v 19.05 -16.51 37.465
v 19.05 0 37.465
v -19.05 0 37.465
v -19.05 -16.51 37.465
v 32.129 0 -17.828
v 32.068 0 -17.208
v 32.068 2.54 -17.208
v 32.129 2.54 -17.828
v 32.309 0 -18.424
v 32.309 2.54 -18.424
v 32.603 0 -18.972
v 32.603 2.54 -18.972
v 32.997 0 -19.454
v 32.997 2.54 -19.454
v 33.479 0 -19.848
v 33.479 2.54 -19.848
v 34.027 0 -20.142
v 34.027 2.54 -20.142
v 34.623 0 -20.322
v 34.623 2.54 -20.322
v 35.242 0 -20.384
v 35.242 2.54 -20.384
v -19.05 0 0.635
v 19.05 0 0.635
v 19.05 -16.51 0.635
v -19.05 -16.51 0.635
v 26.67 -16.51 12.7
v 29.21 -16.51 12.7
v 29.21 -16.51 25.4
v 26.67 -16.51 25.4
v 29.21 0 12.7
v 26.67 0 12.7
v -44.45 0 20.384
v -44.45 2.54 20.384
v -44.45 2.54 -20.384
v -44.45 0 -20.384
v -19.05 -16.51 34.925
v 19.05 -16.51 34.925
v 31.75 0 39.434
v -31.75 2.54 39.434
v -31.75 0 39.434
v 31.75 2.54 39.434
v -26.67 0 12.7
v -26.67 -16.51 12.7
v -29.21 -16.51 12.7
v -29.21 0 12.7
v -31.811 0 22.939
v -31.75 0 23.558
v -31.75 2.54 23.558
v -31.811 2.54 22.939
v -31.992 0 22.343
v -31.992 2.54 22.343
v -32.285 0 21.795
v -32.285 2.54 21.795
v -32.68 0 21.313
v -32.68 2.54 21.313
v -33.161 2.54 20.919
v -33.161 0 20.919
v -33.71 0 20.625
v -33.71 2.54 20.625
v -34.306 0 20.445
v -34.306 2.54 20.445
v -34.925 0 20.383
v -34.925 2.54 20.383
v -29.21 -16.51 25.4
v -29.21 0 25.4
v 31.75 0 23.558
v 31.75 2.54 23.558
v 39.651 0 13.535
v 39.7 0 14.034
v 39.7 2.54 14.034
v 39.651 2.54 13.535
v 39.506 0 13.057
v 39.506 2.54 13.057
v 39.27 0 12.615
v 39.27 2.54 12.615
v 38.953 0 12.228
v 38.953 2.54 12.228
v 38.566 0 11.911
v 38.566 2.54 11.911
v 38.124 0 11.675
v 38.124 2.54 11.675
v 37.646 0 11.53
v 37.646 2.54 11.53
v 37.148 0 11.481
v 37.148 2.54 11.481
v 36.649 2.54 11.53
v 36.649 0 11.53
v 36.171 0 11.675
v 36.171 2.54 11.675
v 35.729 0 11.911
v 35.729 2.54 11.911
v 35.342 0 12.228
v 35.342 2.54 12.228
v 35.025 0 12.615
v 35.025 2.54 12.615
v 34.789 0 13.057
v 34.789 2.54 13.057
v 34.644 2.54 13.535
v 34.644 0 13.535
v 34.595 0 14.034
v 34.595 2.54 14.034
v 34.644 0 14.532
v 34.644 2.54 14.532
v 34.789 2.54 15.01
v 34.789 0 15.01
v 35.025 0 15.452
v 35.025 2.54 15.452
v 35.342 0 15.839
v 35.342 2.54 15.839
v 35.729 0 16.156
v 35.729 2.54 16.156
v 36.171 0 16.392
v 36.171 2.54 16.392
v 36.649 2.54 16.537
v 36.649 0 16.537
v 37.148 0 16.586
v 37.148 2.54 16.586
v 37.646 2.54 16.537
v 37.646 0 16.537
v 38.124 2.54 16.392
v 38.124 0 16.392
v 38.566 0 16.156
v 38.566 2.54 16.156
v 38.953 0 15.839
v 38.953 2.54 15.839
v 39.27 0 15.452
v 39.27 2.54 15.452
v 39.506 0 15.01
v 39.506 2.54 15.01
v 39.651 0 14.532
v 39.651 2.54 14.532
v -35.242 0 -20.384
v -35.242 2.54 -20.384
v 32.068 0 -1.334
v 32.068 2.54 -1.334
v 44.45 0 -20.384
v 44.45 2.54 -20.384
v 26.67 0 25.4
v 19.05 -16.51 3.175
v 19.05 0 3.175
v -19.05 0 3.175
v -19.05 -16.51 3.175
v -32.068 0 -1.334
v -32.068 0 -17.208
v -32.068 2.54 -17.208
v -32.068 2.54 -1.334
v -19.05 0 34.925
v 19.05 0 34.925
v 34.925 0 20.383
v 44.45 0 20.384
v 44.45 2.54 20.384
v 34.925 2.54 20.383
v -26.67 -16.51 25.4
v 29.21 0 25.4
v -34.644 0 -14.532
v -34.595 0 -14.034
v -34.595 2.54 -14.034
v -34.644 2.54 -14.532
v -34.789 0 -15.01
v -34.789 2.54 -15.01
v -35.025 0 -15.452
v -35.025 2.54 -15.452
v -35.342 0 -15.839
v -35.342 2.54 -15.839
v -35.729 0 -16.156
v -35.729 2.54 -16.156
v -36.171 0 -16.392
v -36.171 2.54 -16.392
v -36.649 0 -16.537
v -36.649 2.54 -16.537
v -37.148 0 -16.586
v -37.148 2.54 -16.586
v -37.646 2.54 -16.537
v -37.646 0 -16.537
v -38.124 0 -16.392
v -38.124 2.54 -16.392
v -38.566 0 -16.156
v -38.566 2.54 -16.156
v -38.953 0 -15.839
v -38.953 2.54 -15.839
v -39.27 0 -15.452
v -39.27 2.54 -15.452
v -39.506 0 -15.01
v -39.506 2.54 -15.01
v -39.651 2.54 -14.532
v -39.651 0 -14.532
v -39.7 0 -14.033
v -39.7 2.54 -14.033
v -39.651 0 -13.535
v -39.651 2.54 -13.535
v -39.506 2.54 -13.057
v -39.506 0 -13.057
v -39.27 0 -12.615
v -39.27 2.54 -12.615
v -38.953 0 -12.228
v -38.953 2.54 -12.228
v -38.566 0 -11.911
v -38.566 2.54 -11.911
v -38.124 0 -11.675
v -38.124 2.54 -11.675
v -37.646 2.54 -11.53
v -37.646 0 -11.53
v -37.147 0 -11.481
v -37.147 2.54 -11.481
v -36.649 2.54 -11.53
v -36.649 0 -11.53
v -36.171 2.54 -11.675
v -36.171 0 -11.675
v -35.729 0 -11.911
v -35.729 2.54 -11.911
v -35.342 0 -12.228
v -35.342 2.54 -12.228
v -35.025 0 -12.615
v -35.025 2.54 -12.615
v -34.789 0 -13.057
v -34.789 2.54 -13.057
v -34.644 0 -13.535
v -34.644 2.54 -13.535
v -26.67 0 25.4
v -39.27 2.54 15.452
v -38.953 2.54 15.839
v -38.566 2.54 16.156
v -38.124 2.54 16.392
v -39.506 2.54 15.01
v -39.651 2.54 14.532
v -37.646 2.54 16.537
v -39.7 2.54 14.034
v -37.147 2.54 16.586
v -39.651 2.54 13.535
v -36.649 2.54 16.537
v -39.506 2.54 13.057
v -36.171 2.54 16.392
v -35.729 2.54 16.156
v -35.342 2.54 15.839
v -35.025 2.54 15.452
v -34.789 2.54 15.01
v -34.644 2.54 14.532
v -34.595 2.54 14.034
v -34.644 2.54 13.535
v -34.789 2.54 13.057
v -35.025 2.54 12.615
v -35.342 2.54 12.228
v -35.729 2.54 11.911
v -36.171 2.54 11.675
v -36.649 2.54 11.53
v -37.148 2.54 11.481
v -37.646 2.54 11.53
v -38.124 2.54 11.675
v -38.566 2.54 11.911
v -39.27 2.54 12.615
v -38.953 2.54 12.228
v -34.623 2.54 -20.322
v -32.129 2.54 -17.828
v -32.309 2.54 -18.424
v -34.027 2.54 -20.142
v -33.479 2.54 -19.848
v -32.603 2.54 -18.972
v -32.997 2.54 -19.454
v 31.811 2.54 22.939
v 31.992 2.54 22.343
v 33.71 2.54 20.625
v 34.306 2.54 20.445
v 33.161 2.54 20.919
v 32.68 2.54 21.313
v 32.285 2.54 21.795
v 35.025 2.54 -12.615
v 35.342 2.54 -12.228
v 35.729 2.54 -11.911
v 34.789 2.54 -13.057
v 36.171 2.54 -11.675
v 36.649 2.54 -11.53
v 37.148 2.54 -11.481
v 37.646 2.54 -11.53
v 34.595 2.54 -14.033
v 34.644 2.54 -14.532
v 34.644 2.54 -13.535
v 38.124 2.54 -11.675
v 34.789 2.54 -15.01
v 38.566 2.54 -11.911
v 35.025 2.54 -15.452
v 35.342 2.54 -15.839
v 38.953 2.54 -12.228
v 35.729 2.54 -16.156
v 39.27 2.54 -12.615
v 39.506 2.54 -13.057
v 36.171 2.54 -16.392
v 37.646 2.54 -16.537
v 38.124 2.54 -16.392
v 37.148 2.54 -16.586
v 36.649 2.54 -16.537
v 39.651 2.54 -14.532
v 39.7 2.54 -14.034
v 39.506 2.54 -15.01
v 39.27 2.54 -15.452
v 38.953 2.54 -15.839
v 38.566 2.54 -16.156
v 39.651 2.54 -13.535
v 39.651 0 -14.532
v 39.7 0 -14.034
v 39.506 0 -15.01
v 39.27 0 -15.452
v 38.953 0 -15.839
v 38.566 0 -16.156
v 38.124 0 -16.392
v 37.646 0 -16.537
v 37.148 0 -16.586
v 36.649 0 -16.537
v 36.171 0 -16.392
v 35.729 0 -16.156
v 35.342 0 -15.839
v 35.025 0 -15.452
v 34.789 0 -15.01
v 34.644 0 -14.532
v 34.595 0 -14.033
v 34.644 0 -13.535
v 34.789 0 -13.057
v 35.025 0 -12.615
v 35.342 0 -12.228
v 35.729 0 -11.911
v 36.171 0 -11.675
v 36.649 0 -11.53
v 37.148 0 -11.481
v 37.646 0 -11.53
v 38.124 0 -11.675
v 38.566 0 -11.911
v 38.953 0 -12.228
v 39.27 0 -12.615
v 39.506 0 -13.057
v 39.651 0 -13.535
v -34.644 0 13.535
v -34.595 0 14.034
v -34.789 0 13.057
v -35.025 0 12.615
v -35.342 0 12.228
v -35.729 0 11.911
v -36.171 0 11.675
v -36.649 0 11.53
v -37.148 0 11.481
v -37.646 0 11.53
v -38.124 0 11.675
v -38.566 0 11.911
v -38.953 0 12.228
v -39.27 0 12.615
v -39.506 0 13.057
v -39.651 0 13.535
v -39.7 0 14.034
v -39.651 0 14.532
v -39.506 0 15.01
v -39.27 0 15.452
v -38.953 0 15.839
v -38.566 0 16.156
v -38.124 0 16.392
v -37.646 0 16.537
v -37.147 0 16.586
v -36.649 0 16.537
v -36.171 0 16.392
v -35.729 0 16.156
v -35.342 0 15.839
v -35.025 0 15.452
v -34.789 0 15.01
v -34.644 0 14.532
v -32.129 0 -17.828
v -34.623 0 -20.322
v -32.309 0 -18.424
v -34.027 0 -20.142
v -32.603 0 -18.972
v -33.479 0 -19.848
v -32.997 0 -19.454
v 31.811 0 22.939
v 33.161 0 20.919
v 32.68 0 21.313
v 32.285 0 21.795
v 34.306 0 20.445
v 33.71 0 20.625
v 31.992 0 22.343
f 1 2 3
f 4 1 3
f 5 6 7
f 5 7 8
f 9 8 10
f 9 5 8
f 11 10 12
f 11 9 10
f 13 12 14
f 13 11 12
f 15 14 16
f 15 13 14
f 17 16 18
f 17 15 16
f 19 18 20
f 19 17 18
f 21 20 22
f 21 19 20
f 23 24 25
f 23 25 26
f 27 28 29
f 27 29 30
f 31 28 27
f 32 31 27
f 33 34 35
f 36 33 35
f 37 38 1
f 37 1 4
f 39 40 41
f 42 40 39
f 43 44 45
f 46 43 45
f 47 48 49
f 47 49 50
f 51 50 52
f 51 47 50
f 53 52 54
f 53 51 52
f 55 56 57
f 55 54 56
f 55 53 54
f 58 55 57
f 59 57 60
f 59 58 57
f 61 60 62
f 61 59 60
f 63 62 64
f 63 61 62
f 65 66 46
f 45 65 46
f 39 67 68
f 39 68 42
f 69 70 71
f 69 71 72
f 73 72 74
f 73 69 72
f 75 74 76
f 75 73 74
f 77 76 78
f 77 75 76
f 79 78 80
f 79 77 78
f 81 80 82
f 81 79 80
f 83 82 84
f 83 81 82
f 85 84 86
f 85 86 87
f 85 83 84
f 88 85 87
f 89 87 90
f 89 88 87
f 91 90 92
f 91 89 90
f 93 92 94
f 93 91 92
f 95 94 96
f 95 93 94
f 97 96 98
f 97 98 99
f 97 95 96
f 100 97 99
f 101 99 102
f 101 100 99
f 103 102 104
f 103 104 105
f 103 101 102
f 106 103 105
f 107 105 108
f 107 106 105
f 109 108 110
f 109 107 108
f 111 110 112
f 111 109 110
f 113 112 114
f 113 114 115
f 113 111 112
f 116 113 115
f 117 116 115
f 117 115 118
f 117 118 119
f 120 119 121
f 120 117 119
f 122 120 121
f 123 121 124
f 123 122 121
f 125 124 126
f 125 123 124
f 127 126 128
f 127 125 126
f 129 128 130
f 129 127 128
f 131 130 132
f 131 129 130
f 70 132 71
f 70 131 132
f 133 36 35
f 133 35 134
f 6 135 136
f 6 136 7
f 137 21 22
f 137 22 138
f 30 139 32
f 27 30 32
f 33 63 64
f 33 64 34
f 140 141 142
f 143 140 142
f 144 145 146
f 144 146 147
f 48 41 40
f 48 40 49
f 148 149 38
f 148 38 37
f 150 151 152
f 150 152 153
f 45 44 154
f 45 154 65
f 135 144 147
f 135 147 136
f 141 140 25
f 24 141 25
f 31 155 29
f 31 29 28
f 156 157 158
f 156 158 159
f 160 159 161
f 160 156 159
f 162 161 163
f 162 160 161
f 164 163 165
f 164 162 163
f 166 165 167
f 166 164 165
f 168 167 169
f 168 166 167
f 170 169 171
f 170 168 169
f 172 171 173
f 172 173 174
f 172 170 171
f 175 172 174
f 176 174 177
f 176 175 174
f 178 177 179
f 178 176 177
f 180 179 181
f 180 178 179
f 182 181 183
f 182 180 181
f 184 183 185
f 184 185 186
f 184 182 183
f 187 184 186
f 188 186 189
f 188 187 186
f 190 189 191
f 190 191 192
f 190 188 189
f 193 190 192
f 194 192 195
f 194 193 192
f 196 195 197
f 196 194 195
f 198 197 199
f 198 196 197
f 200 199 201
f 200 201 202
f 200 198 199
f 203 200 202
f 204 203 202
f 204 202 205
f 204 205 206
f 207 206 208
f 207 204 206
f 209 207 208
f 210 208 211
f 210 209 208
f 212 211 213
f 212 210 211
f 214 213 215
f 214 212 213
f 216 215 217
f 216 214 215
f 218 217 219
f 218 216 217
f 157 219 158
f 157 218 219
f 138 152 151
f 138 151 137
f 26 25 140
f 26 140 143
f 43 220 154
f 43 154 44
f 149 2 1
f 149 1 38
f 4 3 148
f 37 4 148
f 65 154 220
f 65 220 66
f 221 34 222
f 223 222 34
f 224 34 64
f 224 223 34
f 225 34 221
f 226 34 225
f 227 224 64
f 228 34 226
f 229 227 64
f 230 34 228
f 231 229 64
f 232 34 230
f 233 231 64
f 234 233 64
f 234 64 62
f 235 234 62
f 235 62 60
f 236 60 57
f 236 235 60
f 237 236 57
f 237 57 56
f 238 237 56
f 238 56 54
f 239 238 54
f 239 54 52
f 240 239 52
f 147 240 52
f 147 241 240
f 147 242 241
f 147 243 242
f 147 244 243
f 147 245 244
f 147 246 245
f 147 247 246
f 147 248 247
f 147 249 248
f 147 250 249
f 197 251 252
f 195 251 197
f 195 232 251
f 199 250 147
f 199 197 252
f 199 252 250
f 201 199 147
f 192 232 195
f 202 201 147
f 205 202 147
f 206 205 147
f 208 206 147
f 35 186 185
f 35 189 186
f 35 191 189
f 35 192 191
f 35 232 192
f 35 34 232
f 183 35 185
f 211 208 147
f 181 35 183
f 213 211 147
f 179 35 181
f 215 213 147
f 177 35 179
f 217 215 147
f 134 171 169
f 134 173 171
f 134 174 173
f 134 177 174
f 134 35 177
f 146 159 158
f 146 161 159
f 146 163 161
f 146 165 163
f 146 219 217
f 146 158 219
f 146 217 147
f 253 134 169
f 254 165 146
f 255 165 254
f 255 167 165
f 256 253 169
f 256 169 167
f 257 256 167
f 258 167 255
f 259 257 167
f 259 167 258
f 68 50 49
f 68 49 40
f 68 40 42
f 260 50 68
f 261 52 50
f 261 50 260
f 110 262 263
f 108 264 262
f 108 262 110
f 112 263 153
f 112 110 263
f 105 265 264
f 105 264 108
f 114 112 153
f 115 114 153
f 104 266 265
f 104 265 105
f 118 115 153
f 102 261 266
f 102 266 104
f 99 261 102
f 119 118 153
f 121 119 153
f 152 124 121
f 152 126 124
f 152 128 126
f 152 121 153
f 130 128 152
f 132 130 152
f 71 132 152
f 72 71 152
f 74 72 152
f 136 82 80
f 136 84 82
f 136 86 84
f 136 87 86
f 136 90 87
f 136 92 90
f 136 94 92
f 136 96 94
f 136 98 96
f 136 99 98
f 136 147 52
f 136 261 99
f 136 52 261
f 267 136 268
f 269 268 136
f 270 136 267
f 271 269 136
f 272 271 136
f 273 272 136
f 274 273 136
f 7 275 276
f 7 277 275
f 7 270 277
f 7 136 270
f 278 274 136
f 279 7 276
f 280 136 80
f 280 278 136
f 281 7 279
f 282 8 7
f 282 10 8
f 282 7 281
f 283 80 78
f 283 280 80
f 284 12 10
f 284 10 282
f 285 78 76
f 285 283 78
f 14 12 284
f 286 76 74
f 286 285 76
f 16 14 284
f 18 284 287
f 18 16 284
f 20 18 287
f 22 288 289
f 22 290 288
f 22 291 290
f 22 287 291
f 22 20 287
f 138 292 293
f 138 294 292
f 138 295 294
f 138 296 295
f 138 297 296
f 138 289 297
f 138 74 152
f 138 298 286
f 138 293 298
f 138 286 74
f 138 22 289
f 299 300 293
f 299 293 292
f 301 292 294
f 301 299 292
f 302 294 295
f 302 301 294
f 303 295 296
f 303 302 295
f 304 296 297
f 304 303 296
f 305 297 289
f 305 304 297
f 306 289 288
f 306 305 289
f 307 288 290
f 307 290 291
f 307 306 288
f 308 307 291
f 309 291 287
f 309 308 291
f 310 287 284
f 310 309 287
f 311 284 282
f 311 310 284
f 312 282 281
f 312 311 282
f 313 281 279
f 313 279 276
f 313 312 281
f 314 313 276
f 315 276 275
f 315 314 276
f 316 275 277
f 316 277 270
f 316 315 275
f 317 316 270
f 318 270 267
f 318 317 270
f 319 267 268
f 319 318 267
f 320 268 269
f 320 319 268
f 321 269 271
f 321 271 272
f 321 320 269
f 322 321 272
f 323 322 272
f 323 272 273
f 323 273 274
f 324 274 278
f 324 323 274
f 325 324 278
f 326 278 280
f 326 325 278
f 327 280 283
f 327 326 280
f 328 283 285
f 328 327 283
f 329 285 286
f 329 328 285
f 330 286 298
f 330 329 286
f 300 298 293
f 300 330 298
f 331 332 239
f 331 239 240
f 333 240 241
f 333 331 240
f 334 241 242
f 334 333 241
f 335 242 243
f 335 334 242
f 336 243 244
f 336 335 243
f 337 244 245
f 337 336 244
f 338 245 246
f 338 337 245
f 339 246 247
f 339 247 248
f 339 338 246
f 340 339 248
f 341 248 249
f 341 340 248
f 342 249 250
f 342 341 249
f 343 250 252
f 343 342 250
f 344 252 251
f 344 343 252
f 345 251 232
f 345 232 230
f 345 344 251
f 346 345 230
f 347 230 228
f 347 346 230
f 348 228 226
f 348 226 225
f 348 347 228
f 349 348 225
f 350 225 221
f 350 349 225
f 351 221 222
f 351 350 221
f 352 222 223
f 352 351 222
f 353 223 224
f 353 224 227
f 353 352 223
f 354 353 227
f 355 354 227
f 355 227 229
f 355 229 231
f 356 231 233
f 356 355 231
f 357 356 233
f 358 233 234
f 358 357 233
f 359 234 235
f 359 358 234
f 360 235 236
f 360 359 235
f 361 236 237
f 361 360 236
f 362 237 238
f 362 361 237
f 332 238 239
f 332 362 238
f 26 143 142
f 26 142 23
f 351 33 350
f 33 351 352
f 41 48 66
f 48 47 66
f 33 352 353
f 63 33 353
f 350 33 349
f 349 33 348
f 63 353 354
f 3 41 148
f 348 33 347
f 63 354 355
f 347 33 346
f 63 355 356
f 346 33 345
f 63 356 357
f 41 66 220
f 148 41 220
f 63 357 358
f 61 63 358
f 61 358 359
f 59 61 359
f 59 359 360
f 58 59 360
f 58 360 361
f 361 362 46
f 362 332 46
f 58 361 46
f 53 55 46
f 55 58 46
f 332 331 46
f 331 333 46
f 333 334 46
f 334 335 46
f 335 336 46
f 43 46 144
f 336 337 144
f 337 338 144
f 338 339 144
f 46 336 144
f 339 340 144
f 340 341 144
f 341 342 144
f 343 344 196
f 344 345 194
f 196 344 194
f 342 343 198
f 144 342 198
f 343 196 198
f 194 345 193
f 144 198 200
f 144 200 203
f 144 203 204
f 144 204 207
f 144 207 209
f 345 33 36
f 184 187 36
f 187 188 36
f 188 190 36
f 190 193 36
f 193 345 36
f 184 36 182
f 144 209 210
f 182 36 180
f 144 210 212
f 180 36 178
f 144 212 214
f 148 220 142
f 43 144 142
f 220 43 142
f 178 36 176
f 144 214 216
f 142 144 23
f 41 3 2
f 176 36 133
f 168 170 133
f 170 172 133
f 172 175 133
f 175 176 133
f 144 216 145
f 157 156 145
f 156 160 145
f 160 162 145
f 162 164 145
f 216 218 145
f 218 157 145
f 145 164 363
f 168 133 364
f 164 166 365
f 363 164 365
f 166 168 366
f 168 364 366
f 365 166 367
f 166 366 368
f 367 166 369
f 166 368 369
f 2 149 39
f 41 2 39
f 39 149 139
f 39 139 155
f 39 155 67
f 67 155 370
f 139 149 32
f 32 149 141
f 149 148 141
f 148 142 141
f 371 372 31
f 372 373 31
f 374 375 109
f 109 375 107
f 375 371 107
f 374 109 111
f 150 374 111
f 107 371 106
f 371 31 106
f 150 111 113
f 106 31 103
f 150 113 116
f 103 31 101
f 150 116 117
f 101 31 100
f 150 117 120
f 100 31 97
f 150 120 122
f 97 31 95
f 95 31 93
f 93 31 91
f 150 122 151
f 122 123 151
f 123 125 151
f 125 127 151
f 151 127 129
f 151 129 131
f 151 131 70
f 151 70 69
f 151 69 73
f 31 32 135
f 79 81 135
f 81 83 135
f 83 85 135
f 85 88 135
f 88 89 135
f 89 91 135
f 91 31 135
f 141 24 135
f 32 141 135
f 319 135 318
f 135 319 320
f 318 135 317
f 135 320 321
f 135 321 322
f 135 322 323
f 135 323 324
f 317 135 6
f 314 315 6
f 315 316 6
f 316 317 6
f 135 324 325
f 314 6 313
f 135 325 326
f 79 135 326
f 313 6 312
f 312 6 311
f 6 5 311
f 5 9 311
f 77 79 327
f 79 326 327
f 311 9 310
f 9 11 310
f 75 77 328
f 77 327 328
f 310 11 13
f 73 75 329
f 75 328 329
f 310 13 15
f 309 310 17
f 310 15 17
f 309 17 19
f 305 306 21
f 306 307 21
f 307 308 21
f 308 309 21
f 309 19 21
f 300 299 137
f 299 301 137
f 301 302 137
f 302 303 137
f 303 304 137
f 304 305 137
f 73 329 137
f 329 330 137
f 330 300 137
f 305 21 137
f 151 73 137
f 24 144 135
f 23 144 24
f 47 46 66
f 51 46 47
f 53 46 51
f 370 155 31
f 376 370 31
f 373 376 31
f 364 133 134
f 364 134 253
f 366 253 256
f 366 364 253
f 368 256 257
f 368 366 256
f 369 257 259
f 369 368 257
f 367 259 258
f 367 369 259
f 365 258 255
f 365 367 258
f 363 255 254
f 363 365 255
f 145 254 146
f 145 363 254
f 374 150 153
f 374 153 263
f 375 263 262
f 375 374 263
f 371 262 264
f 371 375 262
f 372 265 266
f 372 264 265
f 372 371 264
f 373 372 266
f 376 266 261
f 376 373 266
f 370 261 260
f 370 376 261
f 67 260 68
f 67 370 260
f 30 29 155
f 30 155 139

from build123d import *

# Parameters (mm, degrees)
SKETCH1_R           = 2.5527
BOSS_EXTRUDE1_DEPTH = 2.54
SKETCH7_W           = 88.9
SKETCH7_H           = 19.05
BOSS_EXTRUDE2_DEPTH = 2.54
SKETCH6_W           = 38.1
SKETCH6_H           = 2.54
SKETCH6_W_2         = 2.54
SKETCH6_H_2         = 12.7
BOSS_EXTRUDE3_DEPTH = 16.51
CUT_EXTRUDE1_DEPTH  = 3.54


with BuildPart() as part:
    # Sketch1 → Boss-Extrude1 (new body)
    with BuildSketch(Plane(origin=(0, 0, 0), x_dir=(1, 0, 0), z_dir=(0, 1, 0))):
        with BuildLine():
            Line((44.45, -20.3835), (-44.45, -20.3835))
            Line((-44.45, -20.3835), (-44.45, 20.3835))
            Line((-44.45, 20.3835), (-35.2425, 20.3835))
            ThreePointArc((-35.2425, 20.3835), (-32.99743597, 19.45356403), (-32.0675, 17.2085))
            Line((-32.0675, 17.2085), (-32.0675, 1.3335))
            Line((-32.0675, 1.3335), (32.0675, 1.3335))
            Line((32.0675, 1.3335), (32.0675, 17.2085))
            ThreePointArc((32.0675, 17.2085), (32.99743597, 19.45356403), (35.2425, 20.3835))
            Line((35.2425, 20.3835), (44.45, 20.3835))
            Line((44.45, 20.3835), (44.45, -20.3835))
        make_face()
        with Locations((37.1475, -14.0335)):
            Circle(SKETCH1_R, mode=Mode.SUBTRACT)
        with Locations((37.1475, 14.0335)):
            Circle(SKETCH1_R, mode=Mode.SUBTRACT)
        with Locations((-37.1475, -14.0335)):
            Circle(SKETCH1_R, mode=Mode.SUBTRACT)
        with Locations((-37.1475, 14.0335)):
            Circle(SKETCH1_R, mode=Mode.SUBTRACT)
    extrude(amount=BOSS_EXTRUDE1_DEPTH)

    # Sketch7 → Boss-Extrude2 (add)
    with BuildSketch(Plane(origin=(0, 2.54, 0), x_dir=(1, 0, 0), z_dir=(0, 1, 0))):
        with Locations((0, -29.9085)):
            Rectangle(SKETCH7_W, SKETCH7_H)
    extrude(amount=-BOSS_EXTRUDE2_DEPTH)

    # Sketch6 → Boss-Extrude3 (add)
    with BuildSketch(Plane(origin=(0, 0, 0), x_dir=(-1, 0, 0), z_dir=(0, -1, 0))):
        with Locations((0, -36.195)):
            Rectangle(SKETCH6_W, SKETCH6_H)
        with Locations((0, -1.905)):
            Rectangle(SKETCH6_W, SKETCH6_H)
        with Locations((27.94, -19.05)):
            Rectangle(SKETCH6_W_2, SKETCH6_H_2)
        with Locations((-27.94, -19.05)):
            Rectangle(SKETCH6_W_2, SKETCH6_H_2)
    extrude(amount=BOSS_EXTRUDE3_DEPTH)

    # Sketch8 → Cut-Extrude1 (cut, through all)
    with BuildSketch(Plane.XZ):
        with BuildLine():
            Line((-44.45, 39.4335), (-31.75, 39.4335))
            Line((-31.75, 39.4335), (-31.75, 23.5585))
            ThreePointArc((-31.75, 23.5585), (-32.67993597, 21.31343597), (-34.925, 20.3835))
            Line((-34.925, 20.3835), (-44.45, 20.3835))
            Line((-44.45, 20.3835), (-44.45, 39.4335))
        make_face()
        with BuildLine():
            Line((44.45, 20.3835), (34.925, 20.3835))
            ThreePointArc((34.925, 20.3835), (32.67993597, 21.31343597), (31.75, 23.5585))
            Line((31.75, 23.5585), (31.75, 39.4335))
            Line((31.75, 39.4335), (44.45, 39.4335))
            Line((44.45, 39.4335), (44.45, 20.3835))
        make_face()
    extrude(amount=-CUT_EXTRUDE1_DEPTH, mode=Mode.SUBTRACT)


solid = part.part
